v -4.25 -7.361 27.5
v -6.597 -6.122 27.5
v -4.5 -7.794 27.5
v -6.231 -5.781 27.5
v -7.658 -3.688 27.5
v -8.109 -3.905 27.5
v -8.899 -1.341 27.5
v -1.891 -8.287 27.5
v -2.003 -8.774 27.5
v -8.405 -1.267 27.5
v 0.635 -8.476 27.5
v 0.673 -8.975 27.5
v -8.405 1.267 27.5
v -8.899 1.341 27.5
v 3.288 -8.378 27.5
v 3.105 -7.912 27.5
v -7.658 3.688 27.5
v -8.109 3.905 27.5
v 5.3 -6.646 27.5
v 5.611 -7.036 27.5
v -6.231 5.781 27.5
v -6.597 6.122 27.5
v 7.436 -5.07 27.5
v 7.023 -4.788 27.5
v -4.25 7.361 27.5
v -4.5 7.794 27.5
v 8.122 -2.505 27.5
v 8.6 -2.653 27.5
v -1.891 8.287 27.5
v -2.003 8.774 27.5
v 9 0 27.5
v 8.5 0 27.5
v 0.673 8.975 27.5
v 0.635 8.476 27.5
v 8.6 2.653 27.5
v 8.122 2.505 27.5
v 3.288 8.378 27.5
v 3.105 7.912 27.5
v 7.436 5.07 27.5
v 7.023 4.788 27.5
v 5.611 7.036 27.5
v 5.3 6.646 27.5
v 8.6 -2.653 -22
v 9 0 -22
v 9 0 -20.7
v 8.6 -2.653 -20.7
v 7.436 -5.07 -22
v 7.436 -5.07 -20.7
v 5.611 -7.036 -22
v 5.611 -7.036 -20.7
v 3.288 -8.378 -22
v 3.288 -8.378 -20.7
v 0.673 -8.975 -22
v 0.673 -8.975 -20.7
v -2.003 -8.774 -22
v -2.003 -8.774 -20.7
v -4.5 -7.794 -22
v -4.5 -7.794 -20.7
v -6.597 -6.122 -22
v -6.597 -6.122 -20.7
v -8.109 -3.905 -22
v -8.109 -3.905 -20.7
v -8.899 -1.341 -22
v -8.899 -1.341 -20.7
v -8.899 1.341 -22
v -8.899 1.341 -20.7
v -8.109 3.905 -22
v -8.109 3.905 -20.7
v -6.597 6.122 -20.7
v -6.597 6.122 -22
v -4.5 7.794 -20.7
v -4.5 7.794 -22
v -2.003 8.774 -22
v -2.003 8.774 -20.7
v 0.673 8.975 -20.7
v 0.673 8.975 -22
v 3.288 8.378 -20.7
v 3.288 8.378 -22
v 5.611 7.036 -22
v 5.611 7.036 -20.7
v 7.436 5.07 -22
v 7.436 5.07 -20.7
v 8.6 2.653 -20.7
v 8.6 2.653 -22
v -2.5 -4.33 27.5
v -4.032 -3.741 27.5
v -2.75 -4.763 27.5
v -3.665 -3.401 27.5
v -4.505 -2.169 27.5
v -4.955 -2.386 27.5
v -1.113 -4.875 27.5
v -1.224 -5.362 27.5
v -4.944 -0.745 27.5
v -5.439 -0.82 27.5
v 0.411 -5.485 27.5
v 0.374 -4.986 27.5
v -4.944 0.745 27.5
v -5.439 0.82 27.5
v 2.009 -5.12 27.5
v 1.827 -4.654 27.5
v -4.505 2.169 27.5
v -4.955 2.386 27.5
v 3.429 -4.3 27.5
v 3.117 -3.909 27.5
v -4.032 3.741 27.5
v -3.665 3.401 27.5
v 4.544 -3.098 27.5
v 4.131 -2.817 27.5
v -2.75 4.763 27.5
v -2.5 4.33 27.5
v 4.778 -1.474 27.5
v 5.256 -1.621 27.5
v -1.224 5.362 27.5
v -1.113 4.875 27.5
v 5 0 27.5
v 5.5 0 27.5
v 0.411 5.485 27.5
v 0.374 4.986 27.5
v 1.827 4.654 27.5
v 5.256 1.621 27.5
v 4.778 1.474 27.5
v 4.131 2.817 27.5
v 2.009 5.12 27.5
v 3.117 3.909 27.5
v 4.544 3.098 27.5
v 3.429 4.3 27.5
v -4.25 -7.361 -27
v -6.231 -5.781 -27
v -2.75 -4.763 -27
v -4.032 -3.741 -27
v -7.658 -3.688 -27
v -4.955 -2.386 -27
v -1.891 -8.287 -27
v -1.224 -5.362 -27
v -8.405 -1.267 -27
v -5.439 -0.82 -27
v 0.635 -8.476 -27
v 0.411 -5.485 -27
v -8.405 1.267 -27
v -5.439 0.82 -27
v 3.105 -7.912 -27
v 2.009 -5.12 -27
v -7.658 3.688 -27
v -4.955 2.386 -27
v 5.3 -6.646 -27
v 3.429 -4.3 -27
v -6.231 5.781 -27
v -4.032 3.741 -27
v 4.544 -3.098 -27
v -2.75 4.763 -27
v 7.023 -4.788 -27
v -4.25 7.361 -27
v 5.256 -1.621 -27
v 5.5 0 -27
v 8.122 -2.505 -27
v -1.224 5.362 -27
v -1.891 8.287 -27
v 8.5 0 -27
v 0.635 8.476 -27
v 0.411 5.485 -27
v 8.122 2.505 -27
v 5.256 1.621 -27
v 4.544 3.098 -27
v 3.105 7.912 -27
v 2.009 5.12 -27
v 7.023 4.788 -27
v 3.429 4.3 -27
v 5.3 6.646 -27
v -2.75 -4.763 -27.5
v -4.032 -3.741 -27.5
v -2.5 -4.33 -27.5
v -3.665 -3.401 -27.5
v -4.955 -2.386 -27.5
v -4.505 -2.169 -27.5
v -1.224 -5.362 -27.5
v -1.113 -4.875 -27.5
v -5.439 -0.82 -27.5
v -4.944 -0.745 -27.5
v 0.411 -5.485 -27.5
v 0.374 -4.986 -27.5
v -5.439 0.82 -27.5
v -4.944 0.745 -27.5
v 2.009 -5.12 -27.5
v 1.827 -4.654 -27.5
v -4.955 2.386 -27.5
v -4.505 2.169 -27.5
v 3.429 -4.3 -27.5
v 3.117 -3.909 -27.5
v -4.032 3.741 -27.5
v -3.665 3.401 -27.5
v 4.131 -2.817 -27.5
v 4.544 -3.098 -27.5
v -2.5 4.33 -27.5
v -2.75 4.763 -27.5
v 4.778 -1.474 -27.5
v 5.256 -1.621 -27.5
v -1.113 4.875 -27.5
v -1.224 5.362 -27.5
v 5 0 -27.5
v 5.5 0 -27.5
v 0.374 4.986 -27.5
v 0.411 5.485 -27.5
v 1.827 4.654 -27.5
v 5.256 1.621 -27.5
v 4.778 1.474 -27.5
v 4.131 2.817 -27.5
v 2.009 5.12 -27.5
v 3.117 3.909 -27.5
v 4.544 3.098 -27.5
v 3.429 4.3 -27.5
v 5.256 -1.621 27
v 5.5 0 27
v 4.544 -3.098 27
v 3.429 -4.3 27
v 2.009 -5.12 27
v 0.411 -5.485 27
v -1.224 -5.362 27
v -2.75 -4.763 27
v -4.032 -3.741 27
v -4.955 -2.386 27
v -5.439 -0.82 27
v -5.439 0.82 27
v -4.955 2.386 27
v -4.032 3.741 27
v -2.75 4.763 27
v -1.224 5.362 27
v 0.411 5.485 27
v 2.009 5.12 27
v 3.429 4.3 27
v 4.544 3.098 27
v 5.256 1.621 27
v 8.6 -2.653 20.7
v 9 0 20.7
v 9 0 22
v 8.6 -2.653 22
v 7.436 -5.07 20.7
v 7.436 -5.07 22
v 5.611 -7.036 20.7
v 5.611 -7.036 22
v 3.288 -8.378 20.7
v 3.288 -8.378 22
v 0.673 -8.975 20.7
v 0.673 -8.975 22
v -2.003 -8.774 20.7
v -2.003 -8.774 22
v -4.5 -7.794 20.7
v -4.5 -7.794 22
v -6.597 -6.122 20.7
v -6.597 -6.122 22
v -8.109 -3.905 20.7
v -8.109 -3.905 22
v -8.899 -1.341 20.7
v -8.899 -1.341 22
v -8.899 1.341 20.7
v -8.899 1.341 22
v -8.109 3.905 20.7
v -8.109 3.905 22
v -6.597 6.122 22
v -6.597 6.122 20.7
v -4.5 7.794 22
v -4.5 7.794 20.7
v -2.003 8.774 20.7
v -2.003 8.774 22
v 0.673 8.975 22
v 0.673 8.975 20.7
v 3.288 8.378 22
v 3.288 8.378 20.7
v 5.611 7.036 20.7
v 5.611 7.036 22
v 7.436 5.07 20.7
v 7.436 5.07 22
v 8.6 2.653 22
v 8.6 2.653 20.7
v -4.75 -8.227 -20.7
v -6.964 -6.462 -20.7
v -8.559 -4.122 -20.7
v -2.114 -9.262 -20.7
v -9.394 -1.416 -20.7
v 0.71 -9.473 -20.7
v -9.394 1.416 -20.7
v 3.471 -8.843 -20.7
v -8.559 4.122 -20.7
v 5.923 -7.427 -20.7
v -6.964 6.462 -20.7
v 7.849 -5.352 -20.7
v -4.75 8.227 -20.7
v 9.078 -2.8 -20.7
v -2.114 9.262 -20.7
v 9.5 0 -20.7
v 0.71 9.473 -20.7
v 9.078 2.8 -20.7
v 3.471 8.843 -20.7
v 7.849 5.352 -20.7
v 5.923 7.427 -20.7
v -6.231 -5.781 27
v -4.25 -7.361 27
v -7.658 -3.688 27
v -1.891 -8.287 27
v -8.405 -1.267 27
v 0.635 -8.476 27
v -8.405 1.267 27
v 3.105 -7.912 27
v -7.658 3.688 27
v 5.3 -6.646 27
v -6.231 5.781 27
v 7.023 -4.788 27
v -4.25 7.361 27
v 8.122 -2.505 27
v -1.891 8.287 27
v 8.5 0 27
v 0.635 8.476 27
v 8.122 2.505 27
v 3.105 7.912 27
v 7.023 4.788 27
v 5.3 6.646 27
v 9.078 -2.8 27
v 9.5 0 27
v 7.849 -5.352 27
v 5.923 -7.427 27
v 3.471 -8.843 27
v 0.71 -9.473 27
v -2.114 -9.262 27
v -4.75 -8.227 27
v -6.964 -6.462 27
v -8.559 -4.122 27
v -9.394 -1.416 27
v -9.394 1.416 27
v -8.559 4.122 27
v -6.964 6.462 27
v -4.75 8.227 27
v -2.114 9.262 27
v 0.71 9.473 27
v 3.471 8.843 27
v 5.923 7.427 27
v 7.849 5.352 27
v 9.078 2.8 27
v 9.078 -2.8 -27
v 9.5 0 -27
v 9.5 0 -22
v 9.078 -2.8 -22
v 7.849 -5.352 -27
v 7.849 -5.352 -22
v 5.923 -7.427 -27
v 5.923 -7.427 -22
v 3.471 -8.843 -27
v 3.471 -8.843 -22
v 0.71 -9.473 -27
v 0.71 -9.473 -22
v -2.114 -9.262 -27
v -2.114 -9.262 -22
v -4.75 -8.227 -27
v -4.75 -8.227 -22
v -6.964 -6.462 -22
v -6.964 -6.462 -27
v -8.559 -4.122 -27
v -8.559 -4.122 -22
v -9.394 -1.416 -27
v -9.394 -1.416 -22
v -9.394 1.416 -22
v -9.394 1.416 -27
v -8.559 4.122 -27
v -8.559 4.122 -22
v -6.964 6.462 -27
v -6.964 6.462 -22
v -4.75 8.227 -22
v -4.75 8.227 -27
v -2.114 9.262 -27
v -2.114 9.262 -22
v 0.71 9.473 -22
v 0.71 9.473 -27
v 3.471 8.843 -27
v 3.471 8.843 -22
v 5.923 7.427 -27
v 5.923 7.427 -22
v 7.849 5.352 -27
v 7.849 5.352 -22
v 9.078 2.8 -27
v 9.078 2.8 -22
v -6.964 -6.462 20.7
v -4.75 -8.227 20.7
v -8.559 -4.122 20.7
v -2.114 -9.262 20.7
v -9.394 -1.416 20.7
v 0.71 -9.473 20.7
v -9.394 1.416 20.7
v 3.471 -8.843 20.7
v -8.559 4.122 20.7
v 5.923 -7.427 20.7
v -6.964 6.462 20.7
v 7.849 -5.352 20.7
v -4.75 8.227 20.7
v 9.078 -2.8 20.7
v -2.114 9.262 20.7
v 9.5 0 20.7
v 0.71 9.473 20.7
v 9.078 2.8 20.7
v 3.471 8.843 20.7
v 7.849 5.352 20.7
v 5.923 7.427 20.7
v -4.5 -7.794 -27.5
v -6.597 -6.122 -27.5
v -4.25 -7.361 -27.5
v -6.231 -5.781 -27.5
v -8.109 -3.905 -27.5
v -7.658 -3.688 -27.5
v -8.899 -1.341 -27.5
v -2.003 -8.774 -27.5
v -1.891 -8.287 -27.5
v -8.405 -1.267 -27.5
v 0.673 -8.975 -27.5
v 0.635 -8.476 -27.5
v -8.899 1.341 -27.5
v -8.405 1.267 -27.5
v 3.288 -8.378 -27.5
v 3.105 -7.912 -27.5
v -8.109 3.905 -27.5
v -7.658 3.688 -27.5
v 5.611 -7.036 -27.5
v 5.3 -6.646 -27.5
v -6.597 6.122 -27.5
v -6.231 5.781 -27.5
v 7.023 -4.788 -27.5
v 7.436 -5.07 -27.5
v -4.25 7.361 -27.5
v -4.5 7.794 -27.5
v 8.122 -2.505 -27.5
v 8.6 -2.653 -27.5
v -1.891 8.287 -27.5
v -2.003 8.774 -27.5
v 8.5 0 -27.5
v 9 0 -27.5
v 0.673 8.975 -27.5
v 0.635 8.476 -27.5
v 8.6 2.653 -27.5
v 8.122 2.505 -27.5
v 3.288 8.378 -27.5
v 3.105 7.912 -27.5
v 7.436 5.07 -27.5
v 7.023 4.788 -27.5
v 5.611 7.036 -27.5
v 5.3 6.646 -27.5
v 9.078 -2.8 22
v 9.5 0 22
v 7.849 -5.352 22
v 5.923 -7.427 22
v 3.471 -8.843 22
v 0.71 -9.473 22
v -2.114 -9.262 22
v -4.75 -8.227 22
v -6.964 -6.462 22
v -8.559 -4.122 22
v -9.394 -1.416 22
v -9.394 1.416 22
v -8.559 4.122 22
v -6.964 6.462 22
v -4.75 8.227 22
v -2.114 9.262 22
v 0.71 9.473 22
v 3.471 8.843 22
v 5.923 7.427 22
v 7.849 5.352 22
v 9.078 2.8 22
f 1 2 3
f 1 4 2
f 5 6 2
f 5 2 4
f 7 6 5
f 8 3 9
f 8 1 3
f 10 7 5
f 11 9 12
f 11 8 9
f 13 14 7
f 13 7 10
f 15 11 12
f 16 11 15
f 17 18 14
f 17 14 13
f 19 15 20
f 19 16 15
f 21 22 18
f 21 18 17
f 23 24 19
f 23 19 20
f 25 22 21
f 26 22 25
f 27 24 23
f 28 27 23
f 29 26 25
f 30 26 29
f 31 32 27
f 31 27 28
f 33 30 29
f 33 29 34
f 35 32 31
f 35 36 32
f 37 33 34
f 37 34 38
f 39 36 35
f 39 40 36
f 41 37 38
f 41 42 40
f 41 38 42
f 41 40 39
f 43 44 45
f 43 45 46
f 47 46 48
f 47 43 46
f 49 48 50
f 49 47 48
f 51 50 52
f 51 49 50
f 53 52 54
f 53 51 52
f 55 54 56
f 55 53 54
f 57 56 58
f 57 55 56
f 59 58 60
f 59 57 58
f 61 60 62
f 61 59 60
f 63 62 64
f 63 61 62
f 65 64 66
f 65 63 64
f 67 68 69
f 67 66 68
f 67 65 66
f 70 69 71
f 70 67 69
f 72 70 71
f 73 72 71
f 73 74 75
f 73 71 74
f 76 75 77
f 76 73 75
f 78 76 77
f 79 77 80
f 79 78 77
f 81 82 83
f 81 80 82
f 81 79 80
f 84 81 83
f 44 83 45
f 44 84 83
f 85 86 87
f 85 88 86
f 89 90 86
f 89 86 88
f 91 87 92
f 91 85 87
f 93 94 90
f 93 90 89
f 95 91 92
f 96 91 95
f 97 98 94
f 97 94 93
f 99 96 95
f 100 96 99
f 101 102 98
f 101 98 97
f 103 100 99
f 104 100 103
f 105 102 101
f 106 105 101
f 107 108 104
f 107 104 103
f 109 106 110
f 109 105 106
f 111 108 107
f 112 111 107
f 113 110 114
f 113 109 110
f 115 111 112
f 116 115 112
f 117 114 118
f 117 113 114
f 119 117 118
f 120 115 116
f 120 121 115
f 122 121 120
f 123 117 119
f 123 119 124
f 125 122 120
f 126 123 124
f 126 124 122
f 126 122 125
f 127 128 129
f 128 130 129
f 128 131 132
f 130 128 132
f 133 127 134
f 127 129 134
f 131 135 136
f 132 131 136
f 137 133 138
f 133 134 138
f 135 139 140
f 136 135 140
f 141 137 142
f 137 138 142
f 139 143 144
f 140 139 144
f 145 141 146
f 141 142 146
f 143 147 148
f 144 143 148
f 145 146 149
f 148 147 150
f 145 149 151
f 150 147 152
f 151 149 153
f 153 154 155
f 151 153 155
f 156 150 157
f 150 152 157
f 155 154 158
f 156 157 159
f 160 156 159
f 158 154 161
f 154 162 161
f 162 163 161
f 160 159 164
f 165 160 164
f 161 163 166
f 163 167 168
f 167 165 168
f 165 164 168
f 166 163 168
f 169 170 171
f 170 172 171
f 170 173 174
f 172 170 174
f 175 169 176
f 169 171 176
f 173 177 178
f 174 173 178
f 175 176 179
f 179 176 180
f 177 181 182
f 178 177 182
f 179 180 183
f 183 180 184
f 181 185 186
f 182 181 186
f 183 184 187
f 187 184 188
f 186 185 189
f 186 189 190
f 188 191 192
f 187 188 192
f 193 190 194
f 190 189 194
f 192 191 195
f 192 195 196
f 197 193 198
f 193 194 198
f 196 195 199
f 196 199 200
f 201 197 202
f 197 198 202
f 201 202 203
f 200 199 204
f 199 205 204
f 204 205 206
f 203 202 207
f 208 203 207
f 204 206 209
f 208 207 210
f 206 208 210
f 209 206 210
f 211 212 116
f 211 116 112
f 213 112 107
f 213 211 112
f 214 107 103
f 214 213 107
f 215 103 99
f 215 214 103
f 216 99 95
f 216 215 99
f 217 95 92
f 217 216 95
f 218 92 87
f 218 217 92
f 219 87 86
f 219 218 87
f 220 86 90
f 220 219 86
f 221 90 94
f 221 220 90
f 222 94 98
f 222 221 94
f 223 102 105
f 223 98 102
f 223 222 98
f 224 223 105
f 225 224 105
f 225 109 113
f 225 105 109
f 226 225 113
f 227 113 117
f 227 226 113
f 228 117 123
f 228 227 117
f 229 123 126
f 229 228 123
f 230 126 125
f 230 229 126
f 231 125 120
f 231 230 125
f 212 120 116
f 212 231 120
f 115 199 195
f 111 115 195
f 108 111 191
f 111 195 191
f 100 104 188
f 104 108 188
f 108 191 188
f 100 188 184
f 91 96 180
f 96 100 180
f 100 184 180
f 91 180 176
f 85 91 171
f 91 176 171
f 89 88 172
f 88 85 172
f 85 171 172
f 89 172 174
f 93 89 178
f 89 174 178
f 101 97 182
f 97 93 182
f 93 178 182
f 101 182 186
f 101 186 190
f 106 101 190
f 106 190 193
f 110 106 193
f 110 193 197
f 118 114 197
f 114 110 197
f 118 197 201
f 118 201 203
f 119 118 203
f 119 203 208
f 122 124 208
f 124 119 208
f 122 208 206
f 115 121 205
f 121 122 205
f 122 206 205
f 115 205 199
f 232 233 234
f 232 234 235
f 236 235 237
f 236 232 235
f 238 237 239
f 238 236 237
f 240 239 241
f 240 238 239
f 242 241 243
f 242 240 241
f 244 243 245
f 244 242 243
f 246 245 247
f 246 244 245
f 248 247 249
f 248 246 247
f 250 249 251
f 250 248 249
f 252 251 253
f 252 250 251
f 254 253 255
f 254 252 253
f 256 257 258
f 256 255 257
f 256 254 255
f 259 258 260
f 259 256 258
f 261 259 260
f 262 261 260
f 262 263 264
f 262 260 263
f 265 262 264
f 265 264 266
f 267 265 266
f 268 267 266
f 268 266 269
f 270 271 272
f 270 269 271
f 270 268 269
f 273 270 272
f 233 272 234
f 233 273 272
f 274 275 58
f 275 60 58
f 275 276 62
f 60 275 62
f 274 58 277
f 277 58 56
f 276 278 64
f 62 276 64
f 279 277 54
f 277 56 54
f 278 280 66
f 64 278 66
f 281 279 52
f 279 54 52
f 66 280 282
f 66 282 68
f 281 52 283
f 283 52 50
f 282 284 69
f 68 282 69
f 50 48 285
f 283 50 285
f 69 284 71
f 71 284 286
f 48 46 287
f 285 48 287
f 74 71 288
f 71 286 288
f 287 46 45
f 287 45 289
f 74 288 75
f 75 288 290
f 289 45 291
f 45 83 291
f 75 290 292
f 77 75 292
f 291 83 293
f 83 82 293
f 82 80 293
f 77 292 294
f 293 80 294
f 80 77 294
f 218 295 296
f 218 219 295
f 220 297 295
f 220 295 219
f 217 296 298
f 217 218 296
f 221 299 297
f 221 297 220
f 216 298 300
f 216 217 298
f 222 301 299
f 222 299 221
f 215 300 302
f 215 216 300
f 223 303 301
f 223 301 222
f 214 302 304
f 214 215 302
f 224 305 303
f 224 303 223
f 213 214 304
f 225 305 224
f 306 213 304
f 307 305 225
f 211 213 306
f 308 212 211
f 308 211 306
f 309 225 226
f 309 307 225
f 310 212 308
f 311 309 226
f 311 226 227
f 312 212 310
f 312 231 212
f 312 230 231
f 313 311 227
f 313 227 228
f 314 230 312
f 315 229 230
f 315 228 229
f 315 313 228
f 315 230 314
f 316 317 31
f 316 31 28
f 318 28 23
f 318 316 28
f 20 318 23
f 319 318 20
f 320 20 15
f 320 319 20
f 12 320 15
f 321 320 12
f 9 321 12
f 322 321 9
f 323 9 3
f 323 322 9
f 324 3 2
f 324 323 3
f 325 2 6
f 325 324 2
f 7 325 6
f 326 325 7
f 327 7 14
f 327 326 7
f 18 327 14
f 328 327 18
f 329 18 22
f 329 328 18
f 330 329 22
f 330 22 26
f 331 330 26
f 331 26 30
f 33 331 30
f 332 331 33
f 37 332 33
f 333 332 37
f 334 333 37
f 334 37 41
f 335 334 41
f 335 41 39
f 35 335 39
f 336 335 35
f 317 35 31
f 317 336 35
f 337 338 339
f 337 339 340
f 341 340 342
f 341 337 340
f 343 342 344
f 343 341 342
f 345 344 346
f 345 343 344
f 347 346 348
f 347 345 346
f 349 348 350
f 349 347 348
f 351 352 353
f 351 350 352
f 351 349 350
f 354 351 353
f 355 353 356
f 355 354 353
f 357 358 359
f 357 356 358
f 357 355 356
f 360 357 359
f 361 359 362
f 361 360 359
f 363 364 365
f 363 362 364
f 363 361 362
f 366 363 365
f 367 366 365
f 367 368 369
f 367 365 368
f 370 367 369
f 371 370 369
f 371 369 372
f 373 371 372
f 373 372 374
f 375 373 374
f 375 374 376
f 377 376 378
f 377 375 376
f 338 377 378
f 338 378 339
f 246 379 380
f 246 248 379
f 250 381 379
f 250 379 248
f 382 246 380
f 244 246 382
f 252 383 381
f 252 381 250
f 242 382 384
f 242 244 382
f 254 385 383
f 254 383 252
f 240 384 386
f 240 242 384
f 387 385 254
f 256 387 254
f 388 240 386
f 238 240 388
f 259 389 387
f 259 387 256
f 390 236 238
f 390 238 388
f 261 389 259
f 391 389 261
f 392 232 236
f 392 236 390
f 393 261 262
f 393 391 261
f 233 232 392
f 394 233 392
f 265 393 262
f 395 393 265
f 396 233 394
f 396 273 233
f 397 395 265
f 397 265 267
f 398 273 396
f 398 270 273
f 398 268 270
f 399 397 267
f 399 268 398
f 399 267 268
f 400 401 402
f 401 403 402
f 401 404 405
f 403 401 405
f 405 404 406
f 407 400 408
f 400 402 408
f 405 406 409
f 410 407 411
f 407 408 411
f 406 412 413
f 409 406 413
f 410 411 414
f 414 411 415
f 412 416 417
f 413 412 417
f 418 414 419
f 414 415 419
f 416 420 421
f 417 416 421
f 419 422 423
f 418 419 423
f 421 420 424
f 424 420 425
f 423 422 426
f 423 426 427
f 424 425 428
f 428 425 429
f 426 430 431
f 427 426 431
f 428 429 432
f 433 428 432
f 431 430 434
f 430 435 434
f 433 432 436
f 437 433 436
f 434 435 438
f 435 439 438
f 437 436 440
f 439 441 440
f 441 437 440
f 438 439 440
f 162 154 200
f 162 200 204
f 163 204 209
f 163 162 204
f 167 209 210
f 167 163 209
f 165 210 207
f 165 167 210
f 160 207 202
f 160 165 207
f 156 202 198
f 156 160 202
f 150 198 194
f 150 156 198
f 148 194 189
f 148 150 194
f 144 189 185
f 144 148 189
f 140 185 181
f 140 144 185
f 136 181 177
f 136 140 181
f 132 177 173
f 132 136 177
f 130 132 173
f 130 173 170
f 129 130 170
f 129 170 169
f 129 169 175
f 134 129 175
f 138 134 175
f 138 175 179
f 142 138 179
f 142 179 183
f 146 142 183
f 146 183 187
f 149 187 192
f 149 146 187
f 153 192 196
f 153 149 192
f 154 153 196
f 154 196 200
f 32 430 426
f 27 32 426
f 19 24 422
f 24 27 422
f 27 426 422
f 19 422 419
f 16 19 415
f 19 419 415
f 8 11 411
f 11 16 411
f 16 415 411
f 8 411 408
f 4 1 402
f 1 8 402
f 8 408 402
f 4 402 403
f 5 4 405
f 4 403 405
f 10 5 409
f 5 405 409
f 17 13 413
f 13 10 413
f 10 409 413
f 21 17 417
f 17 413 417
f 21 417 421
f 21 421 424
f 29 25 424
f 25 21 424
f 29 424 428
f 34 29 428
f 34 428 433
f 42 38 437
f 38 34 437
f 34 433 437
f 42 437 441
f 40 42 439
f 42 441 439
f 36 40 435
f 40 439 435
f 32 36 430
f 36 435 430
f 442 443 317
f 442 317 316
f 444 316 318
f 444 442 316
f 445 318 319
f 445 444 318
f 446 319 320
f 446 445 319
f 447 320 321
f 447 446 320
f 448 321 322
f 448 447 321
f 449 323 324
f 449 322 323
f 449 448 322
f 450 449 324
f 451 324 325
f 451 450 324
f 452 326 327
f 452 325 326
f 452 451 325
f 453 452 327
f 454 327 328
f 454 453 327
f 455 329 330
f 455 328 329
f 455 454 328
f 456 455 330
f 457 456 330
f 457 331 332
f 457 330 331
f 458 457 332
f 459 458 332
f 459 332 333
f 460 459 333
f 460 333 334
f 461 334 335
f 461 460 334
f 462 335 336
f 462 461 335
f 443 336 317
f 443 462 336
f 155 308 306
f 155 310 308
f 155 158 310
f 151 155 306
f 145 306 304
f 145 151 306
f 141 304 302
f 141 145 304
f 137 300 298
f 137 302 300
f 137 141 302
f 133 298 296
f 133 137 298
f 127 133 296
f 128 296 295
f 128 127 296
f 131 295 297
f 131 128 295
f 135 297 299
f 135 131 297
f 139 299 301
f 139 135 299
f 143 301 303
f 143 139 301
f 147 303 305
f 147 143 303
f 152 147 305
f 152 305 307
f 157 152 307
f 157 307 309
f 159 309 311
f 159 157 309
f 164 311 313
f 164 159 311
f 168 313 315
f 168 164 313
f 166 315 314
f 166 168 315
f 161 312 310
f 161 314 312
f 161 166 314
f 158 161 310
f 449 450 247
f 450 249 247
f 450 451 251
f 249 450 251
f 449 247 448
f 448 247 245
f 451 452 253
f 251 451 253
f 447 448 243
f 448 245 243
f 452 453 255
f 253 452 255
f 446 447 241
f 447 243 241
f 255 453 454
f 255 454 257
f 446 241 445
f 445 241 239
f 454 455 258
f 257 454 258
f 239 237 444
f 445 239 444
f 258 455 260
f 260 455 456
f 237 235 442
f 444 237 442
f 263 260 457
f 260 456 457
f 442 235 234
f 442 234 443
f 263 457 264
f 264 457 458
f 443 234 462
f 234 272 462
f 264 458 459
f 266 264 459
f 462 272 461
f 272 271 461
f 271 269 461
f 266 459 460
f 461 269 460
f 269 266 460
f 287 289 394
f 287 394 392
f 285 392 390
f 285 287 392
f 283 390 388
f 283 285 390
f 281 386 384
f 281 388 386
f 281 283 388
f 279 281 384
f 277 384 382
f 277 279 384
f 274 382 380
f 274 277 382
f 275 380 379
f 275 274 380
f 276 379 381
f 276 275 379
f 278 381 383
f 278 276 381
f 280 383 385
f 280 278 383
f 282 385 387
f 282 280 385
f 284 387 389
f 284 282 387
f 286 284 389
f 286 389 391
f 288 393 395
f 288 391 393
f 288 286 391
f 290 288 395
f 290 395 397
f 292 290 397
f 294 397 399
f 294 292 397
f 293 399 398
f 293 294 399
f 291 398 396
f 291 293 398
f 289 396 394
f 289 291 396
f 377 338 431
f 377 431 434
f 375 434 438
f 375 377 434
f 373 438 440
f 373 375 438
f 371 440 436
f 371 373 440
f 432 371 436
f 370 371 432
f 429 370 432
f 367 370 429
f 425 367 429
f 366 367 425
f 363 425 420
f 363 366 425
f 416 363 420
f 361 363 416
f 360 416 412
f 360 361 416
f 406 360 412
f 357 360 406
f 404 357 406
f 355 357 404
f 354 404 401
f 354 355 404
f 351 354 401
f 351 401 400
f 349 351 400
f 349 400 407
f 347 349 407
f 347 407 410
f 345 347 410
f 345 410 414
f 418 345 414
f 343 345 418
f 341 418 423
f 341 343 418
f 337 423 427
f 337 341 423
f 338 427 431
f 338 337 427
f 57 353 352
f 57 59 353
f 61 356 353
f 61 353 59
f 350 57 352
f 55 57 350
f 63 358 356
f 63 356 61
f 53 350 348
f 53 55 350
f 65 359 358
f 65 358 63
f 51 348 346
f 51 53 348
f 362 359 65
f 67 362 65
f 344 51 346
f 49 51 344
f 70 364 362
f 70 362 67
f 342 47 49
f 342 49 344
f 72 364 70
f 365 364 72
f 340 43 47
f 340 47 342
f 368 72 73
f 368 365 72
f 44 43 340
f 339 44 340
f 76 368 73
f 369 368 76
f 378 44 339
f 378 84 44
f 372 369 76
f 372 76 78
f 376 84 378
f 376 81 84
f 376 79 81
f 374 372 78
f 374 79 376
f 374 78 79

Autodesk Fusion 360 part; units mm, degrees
sketch "スケッチ1" plane through (0, 0, 0) normal (0, 1, 0) x (1, 0, 0)
  line L0 (0, 0) -> (0, -27.5)
  line L1 (0, -27.5) -> (9.5, -27.5)
  line L2 (9.5, -27.5) -> (9.5, -22)
  line L3 (9.5, -22) -> (9, -22)
  line L4 (9, -22) -> (9, -20.7)
  line L5 (9, -20.7) -> (9.5, -20.7)
  line L6 (9.5, -20.7) -> (9.5, 20.7)
  line L7 (9.5, 20.7) -> (9, 20.7)
  line L8 (9, 20.7) -> (9, 22)
  line L9 (9, 22) -> (9.5, 22)
  line L10 (9.5, 22) -> (9.5, 27.5)
  line L11 (9.5, 27.5) -> (0, 27.5)
  line L12 (0, 27.5) -> (0, 0)
  line L13 (8.5, -27.5) -> (8.5, 27.5)
  line L14 (5.5, -27.5) -> (5.5, -27)
  line L15 (5.5, -27) -> (8.5, -27)
  line L16 (5, -27.5) -> (5, 27.5)
  line L17 (5.5, 27.5) -> (5.5, 27)
  line L18 (5.5, 27) -> (8.5, 27)
  dimension "d1" = 9.5
  dimension "d2" = 27.5
  dimension "d3" = 27.5
  dimension "d4" = 9
  dimension "d5" = 5.5
  dimension "d6" = 1.3
  dimension "d7" = 5.5
  dimension "d8" = 1.3
  dimension "d9" = 8.5
  dimension "d10" = 5
  dimension "d11" = 0.5
  dimension "d12" = 0.5
  dimension "d13" = 0.5
revolve "回転1" add sketch "スケッチ1" angle 360 about axis through (0, 0, 0) along (0, 0, 1) contours L1 L11 L13 L14 L15 L16 L17 L18 makes body 1
revolve "回転2" add sketch "スケッチ1" angle 360 about axis through (0, 0, 1.75) along (0, 0, 1) separate body contours L1 L2 L3 L4 L5 L6 L7 L8 L9 L10 L11 L13 makes body 2
chamfer "面取り1" distance 0.5 angle 45 2 edges at (-8.8571, -3.4353, 27.5) (-8.8571, -3.4353, -27.5) on bodies 2
equation "d2 = ( 55 / 2 ) * 1 mm"
equation "d3 = d2"
equation "d7 = d5"
equation "d8 = d6"
equation "d13 = d12"
